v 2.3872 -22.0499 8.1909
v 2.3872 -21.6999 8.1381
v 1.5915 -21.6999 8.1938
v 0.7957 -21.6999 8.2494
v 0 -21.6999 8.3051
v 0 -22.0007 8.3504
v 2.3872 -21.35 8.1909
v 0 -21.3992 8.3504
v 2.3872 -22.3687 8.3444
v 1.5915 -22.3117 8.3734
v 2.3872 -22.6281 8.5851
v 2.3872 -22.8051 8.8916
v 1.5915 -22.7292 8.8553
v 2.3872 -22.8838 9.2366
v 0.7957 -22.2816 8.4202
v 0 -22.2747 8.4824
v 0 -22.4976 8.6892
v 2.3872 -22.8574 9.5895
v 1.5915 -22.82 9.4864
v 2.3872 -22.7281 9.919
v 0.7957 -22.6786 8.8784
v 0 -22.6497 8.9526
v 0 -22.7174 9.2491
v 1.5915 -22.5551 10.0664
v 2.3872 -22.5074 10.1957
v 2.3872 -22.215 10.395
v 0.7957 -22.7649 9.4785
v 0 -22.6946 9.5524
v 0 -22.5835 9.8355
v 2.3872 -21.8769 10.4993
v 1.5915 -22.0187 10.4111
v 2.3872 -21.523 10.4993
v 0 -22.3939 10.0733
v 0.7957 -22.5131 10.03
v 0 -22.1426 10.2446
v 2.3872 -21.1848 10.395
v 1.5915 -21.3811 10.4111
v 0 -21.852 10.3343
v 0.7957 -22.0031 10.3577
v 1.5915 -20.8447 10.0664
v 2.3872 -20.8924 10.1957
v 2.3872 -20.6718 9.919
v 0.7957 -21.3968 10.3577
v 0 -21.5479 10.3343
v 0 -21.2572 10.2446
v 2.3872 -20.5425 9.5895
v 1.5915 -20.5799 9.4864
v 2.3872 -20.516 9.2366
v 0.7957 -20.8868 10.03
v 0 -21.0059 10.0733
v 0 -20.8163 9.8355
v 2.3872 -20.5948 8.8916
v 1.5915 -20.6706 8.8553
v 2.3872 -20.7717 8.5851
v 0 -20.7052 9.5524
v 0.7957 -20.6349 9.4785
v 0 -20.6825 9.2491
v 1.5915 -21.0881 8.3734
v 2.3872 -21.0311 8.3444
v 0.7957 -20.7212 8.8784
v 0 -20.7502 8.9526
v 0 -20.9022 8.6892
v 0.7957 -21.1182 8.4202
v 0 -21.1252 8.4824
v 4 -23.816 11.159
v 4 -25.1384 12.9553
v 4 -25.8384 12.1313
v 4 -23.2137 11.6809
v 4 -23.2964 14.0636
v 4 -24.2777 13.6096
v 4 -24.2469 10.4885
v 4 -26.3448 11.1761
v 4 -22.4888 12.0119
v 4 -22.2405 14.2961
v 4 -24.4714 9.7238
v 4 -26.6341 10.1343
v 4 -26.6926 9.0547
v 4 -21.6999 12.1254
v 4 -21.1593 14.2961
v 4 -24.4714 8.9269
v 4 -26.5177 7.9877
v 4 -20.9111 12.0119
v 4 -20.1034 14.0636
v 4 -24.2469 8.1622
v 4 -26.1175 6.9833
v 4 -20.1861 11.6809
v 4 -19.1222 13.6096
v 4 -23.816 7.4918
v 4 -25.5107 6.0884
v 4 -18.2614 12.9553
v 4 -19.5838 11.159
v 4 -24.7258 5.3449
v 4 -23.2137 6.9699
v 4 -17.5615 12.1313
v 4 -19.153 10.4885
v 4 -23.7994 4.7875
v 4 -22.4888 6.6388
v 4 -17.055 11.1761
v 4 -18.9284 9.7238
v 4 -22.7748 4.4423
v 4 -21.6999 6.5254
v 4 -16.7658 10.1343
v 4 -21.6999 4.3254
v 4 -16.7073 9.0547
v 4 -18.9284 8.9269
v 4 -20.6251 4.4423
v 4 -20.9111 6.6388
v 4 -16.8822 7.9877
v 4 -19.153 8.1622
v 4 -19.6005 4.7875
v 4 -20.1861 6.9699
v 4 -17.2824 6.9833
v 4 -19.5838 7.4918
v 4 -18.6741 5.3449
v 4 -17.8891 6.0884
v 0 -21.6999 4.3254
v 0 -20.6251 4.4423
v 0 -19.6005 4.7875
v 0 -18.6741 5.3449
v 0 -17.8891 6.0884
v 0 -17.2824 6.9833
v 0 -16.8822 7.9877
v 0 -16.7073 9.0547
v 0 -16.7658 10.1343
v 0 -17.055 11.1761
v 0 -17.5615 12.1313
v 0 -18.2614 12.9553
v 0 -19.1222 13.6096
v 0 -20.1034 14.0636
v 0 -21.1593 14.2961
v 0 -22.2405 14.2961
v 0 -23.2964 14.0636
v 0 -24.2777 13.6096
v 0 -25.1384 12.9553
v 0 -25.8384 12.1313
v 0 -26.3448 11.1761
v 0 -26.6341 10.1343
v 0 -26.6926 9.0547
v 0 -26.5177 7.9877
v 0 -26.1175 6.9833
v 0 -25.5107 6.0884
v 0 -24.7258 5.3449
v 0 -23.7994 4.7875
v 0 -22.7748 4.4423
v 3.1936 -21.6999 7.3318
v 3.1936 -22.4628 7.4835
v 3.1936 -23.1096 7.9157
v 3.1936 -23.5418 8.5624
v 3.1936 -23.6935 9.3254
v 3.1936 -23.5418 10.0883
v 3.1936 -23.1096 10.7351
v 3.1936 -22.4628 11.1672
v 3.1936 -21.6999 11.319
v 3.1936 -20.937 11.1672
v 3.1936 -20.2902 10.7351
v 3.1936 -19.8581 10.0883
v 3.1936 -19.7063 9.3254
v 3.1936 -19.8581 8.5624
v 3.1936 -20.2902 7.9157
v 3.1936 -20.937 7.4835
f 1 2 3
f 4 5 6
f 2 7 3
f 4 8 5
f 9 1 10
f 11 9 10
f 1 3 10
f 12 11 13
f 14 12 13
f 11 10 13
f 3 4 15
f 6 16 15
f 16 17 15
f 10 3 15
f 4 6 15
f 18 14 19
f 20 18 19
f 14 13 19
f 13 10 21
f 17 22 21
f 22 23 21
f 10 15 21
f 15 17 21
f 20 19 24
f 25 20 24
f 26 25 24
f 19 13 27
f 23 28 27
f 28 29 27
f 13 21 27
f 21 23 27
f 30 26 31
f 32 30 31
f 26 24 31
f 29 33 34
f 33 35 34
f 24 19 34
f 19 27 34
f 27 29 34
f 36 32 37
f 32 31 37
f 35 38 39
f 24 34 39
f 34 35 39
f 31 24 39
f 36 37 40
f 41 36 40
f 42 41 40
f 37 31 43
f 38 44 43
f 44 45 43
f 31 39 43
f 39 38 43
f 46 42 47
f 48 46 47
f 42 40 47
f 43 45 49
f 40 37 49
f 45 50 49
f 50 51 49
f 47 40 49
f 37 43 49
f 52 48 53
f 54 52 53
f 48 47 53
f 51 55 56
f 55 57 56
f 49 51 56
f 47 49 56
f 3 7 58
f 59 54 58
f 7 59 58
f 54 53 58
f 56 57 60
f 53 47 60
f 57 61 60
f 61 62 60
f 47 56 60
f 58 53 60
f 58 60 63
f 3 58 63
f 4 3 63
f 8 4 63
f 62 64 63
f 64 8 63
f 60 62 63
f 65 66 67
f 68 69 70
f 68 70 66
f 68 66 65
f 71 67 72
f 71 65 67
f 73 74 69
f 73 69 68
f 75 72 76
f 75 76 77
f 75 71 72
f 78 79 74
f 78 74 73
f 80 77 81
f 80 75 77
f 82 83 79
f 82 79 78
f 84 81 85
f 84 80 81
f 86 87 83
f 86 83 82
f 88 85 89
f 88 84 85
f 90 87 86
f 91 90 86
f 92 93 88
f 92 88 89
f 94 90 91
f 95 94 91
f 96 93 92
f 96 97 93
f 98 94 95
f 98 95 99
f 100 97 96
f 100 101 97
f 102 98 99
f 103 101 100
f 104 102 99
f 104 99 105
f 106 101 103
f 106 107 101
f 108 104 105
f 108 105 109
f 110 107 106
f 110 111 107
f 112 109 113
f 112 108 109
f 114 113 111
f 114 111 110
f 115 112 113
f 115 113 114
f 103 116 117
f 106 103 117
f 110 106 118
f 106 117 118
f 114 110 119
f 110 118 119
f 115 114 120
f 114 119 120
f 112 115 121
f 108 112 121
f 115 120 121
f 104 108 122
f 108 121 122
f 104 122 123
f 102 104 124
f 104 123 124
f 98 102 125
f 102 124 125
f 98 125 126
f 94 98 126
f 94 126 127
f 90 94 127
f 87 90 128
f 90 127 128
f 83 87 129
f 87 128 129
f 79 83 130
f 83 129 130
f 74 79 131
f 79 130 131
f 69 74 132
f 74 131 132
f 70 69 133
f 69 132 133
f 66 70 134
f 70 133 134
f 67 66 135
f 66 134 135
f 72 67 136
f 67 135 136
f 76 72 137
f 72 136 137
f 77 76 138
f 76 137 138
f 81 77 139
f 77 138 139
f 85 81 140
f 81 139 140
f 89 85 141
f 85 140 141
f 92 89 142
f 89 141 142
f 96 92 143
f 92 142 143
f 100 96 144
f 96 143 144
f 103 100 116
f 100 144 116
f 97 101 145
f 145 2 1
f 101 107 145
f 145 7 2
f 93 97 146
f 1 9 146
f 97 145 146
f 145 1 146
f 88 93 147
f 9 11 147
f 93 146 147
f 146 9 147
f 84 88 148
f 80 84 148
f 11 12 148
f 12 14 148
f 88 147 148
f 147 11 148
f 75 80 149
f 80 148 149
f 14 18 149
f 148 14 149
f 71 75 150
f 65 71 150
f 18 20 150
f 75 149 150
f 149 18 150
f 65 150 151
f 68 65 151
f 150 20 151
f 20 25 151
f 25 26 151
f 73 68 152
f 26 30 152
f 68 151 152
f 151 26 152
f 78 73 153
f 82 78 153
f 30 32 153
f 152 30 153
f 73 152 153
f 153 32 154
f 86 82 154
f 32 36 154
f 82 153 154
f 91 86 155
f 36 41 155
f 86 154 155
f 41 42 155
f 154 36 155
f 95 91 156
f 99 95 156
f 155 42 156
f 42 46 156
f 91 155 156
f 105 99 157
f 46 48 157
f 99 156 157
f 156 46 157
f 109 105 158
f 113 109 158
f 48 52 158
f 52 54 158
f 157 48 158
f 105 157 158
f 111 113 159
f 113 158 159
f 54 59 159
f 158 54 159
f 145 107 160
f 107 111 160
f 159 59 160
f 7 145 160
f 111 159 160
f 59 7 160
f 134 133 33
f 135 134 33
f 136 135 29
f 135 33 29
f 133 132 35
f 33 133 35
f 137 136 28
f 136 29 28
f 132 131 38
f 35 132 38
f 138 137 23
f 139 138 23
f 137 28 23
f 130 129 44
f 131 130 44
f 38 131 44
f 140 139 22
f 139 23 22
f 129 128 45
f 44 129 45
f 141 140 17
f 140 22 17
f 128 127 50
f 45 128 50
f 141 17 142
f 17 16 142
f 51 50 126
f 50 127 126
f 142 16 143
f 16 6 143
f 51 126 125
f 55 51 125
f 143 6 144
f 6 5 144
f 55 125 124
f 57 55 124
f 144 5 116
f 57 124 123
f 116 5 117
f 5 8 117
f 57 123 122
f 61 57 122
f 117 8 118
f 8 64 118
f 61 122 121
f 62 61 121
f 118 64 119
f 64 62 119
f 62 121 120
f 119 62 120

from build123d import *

# Parameters (mm, degrees)
SKETCH_1_R      = 5
EXTRUDE_1_DEPTH = 4
CHAMFER_1_SIZE  = 1.5
CHAMFER_1_SIZE2 = 1.616714541


with BuildPart() as part:
    # 草图1 → 凸台-拉伸1 (new body)
    with BuildSketch(Plane(origin=(0, 0, 0), x_dir=(0, 0, -1), z_dir=(1, 0, 0))):
        with Locations((-9.325362428, -21.699923803)):
            Circle(SKETCH_1_R)
    extrude(amount=EXTRUDE_1_DEPTH)

    # 切除-拉伸1 cone 1 section (through the dimple's axis) → 切除-拉伸1 (revolve, cut)
    with BuildSketch(Plane(origin=(4, -21.699923803, 9.325362428), x_dir=(0, 0, -1), z_dir=(0, 1, 0))):
        Polygon((0, 0), (1.3, 0), (0, 18.590866134), align=None)
    revolve(axis=Axis((4, -21.699923803, 9.325362428), (-1, 0, 0)), mode=Mode.SUBTRACT)

    # 倒角1
    chamfer_1_edges = [part.edges().sort_by_distance(p)[0] for p in [
        (4, -21.699923803, 10.625362428),
    ]]
    chamfer_1_side = [part.faces().sort_by_distance(p)[0] for p in [
        (4, -21.699923803, 14.183941072),
    ]]
    chamfer(chamfer_1_edges, length=CHAMFER_1_SIZE, length2=CHAMFER_1_SIZE2, reference=chamfer_1_side[0])


solid = part.part
